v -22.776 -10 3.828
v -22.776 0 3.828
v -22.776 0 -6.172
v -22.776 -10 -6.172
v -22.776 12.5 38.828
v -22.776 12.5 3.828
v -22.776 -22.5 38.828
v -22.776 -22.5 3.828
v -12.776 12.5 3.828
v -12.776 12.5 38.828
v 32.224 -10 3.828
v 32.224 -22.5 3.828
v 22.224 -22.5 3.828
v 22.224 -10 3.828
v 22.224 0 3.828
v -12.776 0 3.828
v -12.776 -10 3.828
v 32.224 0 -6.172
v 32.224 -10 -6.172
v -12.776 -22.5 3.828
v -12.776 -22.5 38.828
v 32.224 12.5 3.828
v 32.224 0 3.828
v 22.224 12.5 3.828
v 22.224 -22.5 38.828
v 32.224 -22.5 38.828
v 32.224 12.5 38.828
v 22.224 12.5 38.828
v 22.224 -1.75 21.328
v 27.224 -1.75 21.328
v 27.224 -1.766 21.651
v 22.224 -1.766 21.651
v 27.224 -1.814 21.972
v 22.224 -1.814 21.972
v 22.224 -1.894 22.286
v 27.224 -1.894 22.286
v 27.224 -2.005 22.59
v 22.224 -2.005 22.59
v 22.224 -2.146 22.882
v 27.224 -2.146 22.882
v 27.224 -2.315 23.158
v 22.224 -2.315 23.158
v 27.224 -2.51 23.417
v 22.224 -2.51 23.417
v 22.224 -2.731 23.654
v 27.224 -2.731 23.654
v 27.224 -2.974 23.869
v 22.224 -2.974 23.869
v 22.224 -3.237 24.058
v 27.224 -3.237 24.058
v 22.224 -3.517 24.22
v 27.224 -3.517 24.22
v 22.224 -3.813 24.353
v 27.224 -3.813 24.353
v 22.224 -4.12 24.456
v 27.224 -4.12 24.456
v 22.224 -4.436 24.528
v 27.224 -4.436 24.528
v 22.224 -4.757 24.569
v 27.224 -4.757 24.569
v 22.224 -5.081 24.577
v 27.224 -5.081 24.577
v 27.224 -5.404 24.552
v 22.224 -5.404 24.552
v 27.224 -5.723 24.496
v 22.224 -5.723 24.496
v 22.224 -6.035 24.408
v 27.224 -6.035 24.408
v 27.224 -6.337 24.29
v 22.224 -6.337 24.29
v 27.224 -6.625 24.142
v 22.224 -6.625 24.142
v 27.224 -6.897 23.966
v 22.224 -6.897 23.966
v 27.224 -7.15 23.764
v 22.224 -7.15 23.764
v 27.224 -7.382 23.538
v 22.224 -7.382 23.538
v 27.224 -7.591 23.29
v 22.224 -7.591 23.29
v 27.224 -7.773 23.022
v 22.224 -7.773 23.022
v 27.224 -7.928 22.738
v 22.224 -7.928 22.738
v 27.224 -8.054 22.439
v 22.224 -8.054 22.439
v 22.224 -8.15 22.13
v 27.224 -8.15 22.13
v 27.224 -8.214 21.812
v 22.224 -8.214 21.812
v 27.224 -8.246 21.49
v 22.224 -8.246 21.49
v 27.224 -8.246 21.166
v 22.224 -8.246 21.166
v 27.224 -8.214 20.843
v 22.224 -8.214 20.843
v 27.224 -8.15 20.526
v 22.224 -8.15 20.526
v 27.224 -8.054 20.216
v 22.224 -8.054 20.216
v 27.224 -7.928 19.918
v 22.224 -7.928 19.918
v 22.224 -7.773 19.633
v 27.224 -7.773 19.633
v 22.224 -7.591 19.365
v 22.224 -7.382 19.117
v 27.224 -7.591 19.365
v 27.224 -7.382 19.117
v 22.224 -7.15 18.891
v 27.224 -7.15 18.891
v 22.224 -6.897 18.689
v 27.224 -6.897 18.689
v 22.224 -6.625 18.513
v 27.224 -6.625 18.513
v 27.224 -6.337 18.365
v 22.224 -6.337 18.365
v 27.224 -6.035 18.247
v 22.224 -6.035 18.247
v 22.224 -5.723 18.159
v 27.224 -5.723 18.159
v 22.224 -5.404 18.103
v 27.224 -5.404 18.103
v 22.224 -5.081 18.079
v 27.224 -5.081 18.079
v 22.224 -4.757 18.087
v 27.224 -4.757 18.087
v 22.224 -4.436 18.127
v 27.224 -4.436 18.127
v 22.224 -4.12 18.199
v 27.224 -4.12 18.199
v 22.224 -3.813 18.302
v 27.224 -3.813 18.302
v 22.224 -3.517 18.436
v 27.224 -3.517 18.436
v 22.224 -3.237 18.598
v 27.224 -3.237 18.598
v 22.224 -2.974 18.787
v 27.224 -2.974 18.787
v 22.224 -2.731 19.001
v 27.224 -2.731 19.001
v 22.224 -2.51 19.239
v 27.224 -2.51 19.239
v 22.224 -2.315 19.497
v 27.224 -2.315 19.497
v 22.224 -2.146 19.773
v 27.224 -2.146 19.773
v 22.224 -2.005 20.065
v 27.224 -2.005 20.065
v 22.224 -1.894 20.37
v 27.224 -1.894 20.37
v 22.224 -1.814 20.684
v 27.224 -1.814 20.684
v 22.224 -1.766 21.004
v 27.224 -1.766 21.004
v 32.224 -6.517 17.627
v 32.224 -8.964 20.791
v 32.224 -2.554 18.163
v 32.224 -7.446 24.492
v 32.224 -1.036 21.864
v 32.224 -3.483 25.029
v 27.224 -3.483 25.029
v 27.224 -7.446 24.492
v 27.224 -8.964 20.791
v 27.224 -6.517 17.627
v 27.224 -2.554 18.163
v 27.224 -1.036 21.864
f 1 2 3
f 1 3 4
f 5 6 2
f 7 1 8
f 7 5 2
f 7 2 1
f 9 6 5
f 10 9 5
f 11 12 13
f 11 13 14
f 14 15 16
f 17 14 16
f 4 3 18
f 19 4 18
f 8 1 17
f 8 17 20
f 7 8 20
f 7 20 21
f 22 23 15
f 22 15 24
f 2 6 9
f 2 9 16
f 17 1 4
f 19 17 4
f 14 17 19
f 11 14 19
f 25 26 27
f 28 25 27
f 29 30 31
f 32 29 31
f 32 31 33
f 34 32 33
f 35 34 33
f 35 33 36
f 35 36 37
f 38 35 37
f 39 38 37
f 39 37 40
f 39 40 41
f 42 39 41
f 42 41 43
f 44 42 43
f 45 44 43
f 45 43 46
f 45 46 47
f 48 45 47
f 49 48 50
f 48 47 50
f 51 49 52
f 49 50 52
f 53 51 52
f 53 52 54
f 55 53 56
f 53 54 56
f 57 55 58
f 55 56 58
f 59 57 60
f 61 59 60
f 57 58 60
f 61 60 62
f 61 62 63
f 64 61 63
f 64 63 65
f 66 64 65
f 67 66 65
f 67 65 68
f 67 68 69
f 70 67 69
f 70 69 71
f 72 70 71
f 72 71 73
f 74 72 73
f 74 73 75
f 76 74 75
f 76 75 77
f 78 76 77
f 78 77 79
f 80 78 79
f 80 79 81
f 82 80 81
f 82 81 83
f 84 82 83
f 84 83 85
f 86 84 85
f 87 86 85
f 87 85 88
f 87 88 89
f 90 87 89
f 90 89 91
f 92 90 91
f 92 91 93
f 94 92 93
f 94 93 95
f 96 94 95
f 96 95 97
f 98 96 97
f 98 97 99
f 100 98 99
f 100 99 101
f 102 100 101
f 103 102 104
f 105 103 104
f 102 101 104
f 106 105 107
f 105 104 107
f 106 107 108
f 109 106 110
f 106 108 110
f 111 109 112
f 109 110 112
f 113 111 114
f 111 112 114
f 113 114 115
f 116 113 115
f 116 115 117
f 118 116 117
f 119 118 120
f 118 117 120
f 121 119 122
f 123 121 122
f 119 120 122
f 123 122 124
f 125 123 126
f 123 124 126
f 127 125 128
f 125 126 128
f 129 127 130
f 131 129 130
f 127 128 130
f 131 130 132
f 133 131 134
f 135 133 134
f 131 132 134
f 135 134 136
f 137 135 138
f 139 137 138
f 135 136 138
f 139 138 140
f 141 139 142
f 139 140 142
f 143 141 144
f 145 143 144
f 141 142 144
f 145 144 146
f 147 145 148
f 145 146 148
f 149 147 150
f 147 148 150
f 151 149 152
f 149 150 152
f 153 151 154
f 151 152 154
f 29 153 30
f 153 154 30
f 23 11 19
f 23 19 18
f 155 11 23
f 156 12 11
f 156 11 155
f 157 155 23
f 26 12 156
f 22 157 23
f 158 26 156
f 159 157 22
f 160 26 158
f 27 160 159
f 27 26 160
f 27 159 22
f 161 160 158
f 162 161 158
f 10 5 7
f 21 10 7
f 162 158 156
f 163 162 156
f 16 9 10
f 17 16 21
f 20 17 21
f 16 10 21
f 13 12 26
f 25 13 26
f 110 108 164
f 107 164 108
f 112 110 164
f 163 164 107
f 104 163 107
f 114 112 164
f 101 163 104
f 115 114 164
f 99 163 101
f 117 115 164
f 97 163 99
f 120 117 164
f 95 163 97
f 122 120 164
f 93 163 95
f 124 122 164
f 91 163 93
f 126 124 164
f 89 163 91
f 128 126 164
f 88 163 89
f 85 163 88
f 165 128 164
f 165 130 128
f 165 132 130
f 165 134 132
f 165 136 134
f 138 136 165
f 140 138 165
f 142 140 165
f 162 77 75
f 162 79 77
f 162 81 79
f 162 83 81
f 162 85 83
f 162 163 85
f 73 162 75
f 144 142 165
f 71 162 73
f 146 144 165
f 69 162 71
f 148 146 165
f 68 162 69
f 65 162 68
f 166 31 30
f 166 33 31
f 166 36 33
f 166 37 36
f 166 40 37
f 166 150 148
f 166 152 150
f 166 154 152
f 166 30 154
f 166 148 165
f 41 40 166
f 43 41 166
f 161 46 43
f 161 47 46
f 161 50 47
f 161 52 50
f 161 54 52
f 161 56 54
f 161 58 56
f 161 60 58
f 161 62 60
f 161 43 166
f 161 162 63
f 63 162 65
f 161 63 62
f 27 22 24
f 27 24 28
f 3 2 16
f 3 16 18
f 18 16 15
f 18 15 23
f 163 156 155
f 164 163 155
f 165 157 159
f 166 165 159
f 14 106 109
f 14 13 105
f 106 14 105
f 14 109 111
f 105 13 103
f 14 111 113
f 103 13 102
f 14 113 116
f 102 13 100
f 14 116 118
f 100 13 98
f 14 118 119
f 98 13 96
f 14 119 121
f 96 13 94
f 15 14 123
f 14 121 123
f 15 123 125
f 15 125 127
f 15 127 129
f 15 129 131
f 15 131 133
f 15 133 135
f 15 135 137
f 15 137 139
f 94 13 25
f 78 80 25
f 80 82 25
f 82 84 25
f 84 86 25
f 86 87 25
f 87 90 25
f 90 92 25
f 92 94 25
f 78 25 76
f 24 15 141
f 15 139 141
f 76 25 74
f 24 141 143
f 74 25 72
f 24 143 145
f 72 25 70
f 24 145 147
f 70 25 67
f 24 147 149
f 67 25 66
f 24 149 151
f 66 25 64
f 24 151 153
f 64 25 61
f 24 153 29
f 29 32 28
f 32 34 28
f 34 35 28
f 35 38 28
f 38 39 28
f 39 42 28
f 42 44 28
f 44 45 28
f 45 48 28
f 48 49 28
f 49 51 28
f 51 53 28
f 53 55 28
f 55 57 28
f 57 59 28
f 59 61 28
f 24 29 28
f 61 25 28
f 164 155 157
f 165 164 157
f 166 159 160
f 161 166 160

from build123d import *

# Parameters (mm, degrees)
F1_DEPTH  = 10
F2_W      = 12.5
F2_H      = 35
F3_DEPTH  = 10
F4_W      = 12.5
F4_H      = 35
F5_DEPTH  = 10
F6_R      = 3.25
F7_DEPTH  = 10
F9_R      = 3.25
F10_DEPTH = 5


with BuildPart() as f1:
    # F0 (on Front) → F1 (new body)
    with BuildSketch(Plane.XZ):
        Polygon((-12.7756818049, 38.8276573637), (-22.7756818049, 38.8276573637), (-22.7756818049, -6.1723426363), (32.2243181951, -6.1723426363), (32.2243181951, 38.8276573637), (22.2243181951, 38.8276573637), (22.2243181951, 3.8276573637), (-12.7756818049, 3.8276573637), align=None)
    extrude(amount=F1_DEPTH)

    # F2 (on face) → F3 (join)
    with BuildSketch(Plane.YZ.offset(32.2243181951)):
        with Locations((-16.25, 21.3276573637)):
            Rectangle(F2_W, F2_H)
        with Locations((6.25, 21.3276573637)):
            Rectangle(F2_W, F2_H)
    extrude(amount=-F3_DEPTH)

    # F4 (on face) → F5 (join)
    with BuildSketch(Plane(origin=(-22.7756818049, 0, 0), x_dir=(0, -1, 0), z_dir=(-1, 0, 0))):
        with Locations((-6.25, 21.3276573637)):
            Rectangle(F4_W, F4_H)
        with Locations((16.25, 21.3276573637)):
            Rectangle(F4_W, F4_H)
    extrude(amount=-F5_DEPTH)

    # F6 (on face) → F7 (cut)
    with BuildSketch(Plane.YZ.offset(32.2243181951)):
        with Locations((-5, 21.3276573637)):
            Circle(F6_R)
    extrude(amount=-F7_DEPTH, mode=Mode.SUBTRACT)

    # F9 (on face) → F10 (cut)
    with BuildSketch(Plane.YZ.offset(32.2243181951)):
        Polygon((-1.0361268053, 21.8640427628), (-3.4825867845, 25.0286649472), (-7.4464599792, 24.4922795481), (-8.9638731947, 20.7912719646), (-6.5174132155, 17.6266497802), (-2.5535400208, 18.1630351792), align=None)
        with Locations((-5, 21.3276573637)):
            Circle(F9_R, mode=Mode.SUBTRACT)
    extrude(amount=-F10_DEPTH, mode=Mode.SUBTRACT)


solid = f1.part
